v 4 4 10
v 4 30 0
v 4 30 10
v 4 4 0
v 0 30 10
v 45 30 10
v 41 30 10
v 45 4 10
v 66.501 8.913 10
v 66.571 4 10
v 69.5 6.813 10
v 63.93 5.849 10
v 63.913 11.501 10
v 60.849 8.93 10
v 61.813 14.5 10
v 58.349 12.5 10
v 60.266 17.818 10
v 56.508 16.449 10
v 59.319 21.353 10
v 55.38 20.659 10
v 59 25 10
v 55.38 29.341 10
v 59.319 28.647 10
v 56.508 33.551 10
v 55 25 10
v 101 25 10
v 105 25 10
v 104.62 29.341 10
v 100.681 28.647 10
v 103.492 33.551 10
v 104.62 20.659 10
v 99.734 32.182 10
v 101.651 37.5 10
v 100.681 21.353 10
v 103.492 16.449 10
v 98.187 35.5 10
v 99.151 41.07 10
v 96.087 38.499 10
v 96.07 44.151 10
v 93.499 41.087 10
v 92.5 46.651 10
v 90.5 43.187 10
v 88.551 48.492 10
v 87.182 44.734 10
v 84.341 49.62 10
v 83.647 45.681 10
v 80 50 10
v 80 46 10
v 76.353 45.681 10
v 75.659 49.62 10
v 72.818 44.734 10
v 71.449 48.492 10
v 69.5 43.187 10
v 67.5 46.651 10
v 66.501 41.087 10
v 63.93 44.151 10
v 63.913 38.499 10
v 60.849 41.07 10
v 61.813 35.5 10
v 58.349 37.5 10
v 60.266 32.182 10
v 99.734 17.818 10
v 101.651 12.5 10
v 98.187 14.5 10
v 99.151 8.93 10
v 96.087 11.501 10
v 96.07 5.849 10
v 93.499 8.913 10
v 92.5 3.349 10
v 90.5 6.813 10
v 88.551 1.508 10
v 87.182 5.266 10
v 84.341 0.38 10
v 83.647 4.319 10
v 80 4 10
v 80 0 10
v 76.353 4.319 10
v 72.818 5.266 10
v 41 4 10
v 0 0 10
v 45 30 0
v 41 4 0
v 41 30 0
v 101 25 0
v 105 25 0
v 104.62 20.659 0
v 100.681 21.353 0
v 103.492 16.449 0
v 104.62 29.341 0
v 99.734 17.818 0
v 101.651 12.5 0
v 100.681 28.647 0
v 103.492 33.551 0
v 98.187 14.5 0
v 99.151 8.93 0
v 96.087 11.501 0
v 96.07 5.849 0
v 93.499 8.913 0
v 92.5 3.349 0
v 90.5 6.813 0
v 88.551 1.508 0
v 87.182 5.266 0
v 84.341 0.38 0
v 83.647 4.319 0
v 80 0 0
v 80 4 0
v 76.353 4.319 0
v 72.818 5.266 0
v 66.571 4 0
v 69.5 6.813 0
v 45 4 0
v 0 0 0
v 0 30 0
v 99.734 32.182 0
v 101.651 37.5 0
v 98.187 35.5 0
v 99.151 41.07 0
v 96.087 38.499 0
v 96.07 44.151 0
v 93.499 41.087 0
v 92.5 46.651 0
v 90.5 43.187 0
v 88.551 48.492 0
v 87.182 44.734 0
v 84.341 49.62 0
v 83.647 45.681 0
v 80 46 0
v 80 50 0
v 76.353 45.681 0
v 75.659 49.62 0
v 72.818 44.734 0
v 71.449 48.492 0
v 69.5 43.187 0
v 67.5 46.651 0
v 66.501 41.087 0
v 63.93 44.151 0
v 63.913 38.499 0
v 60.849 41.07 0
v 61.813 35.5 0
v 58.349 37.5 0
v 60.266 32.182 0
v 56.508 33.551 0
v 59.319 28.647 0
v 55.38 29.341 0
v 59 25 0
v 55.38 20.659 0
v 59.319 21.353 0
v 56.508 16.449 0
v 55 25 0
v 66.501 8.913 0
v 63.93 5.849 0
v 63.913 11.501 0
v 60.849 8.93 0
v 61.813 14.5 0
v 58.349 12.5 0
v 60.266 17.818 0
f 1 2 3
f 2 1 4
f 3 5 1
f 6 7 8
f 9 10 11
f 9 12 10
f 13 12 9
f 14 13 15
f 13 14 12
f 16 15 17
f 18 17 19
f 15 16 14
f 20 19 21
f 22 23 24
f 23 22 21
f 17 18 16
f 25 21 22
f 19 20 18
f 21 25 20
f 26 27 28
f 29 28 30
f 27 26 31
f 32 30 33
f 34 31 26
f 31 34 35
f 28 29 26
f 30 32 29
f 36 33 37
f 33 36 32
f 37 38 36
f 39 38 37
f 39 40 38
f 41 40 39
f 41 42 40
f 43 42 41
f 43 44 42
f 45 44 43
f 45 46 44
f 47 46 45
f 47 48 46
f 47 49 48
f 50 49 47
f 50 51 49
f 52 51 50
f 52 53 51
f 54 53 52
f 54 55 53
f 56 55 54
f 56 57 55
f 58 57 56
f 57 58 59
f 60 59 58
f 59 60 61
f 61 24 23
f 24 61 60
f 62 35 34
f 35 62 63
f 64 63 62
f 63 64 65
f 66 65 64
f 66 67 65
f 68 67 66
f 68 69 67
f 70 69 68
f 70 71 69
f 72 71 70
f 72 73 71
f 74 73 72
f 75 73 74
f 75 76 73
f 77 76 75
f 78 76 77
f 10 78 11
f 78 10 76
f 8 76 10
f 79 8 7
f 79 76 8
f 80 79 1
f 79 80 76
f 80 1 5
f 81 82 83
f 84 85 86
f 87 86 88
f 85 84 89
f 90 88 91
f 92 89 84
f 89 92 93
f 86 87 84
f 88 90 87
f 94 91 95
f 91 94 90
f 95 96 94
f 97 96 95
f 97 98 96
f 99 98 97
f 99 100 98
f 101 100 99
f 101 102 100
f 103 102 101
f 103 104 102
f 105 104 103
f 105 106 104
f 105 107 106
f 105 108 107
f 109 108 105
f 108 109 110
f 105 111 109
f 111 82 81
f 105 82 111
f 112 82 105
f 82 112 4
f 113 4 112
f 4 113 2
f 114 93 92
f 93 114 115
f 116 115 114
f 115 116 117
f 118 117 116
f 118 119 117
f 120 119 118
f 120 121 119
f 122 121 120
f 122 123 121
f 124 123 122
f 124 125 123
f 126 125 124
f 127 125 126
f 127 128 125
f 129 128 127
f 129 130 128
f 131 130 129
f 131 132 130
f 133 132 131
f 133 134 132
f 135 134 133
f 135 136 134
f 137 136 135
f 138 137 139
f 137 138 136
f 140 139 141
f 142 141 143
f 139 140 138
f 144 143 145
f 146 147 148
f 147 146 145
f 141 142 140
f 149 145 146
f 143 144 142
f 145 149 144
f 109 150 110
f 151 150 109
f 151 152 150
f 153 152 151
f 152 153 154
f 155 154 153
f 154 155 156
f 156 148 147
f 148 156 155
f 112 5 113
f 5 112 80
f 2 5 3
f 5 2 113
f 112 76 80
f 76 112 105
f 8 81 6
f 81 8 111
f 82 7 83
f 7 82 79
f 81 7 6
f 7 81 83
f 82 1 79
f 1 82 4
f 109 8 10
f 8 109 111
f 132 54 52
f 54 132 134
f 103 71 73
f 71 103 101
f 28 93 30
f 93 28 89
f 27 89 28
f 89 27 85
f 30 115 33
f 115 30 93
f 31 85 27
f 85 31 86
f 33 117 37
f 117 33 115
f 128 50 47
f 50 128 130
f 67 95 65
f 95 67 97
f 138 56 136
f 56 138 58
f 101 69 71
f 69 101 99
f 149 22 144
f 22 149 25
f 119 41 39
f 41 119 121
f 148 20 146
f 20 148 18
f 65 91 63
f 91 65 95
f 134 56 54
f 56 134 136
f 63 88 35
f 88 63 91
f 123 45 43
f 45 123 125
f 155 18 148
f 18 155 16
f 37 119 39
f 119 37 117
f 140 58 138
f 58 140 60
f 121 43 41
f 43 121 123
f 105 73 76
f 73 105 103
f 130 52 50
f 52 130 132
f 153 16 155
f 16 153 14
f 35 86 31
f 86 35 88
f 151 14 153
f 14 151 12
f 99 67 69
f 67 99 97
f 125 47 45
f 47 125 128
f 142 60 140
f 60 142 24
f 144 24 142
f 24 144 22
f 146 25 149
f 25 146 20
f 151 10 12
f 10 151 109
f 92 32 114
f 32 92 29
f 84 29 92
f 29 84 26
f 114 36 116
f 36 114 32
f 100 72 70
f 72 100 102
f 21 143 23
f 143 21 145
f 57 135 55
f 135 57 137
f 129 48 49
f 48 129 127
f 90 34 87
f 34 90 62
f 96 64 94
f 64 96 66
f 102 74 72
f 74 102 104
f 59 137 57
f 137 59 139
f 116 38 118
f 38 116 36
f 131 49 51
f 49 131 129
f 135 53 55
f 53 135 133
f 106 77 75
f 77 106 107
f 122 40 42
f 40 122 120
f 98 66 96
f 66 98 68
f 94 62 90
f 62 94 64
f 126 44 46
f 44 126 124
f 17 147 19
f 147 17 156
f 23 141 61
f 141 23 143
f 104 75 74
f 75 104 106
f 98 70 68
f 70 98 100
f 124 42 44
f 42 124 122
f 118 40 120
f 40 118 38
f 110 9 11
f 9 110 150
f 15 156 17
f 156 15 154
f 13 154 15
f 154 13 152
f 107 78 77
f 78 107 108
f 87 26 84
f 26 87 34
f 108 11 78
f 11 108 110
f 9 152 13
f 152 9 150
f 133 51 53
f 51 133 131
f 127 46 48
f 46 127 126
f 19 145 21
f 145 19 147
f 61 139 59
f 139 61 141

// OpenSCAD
$fn=36;

Thickness_of_shelf=37;
Length_of_fork=30;
Distance_to_cables=80;
Passage_for_cables_radius=25;
Thickness_of_structure=4;
Extrusion_height=10;


difference()
{

union()
{
cube([Thickness_of_structure,Length_of_fork,Extrusion_height]);
translate([Thickness_of_shelf+Thickness_of_structure,0,0])
cube([Thickness_of_structure,Length_of_fork,Extrusion_height]);

translate([0,0,0])
rotate([0,0,0])
cube([Distance_to_cables,Thickness_of_structure,Extrusion_height]);

translate([Distance_to_cables,Passage_for_cables_radius,0])
cylinder(r=Passage_for_cables_radius,h=Extrusion_height);

}


translate([Distance_to_cables,Passage_for_cables_radius,0])
cylinder(r=Passage_for_cables_radius-Thickness_of_structure,h=Extrusion_height*3,center=true);



}
